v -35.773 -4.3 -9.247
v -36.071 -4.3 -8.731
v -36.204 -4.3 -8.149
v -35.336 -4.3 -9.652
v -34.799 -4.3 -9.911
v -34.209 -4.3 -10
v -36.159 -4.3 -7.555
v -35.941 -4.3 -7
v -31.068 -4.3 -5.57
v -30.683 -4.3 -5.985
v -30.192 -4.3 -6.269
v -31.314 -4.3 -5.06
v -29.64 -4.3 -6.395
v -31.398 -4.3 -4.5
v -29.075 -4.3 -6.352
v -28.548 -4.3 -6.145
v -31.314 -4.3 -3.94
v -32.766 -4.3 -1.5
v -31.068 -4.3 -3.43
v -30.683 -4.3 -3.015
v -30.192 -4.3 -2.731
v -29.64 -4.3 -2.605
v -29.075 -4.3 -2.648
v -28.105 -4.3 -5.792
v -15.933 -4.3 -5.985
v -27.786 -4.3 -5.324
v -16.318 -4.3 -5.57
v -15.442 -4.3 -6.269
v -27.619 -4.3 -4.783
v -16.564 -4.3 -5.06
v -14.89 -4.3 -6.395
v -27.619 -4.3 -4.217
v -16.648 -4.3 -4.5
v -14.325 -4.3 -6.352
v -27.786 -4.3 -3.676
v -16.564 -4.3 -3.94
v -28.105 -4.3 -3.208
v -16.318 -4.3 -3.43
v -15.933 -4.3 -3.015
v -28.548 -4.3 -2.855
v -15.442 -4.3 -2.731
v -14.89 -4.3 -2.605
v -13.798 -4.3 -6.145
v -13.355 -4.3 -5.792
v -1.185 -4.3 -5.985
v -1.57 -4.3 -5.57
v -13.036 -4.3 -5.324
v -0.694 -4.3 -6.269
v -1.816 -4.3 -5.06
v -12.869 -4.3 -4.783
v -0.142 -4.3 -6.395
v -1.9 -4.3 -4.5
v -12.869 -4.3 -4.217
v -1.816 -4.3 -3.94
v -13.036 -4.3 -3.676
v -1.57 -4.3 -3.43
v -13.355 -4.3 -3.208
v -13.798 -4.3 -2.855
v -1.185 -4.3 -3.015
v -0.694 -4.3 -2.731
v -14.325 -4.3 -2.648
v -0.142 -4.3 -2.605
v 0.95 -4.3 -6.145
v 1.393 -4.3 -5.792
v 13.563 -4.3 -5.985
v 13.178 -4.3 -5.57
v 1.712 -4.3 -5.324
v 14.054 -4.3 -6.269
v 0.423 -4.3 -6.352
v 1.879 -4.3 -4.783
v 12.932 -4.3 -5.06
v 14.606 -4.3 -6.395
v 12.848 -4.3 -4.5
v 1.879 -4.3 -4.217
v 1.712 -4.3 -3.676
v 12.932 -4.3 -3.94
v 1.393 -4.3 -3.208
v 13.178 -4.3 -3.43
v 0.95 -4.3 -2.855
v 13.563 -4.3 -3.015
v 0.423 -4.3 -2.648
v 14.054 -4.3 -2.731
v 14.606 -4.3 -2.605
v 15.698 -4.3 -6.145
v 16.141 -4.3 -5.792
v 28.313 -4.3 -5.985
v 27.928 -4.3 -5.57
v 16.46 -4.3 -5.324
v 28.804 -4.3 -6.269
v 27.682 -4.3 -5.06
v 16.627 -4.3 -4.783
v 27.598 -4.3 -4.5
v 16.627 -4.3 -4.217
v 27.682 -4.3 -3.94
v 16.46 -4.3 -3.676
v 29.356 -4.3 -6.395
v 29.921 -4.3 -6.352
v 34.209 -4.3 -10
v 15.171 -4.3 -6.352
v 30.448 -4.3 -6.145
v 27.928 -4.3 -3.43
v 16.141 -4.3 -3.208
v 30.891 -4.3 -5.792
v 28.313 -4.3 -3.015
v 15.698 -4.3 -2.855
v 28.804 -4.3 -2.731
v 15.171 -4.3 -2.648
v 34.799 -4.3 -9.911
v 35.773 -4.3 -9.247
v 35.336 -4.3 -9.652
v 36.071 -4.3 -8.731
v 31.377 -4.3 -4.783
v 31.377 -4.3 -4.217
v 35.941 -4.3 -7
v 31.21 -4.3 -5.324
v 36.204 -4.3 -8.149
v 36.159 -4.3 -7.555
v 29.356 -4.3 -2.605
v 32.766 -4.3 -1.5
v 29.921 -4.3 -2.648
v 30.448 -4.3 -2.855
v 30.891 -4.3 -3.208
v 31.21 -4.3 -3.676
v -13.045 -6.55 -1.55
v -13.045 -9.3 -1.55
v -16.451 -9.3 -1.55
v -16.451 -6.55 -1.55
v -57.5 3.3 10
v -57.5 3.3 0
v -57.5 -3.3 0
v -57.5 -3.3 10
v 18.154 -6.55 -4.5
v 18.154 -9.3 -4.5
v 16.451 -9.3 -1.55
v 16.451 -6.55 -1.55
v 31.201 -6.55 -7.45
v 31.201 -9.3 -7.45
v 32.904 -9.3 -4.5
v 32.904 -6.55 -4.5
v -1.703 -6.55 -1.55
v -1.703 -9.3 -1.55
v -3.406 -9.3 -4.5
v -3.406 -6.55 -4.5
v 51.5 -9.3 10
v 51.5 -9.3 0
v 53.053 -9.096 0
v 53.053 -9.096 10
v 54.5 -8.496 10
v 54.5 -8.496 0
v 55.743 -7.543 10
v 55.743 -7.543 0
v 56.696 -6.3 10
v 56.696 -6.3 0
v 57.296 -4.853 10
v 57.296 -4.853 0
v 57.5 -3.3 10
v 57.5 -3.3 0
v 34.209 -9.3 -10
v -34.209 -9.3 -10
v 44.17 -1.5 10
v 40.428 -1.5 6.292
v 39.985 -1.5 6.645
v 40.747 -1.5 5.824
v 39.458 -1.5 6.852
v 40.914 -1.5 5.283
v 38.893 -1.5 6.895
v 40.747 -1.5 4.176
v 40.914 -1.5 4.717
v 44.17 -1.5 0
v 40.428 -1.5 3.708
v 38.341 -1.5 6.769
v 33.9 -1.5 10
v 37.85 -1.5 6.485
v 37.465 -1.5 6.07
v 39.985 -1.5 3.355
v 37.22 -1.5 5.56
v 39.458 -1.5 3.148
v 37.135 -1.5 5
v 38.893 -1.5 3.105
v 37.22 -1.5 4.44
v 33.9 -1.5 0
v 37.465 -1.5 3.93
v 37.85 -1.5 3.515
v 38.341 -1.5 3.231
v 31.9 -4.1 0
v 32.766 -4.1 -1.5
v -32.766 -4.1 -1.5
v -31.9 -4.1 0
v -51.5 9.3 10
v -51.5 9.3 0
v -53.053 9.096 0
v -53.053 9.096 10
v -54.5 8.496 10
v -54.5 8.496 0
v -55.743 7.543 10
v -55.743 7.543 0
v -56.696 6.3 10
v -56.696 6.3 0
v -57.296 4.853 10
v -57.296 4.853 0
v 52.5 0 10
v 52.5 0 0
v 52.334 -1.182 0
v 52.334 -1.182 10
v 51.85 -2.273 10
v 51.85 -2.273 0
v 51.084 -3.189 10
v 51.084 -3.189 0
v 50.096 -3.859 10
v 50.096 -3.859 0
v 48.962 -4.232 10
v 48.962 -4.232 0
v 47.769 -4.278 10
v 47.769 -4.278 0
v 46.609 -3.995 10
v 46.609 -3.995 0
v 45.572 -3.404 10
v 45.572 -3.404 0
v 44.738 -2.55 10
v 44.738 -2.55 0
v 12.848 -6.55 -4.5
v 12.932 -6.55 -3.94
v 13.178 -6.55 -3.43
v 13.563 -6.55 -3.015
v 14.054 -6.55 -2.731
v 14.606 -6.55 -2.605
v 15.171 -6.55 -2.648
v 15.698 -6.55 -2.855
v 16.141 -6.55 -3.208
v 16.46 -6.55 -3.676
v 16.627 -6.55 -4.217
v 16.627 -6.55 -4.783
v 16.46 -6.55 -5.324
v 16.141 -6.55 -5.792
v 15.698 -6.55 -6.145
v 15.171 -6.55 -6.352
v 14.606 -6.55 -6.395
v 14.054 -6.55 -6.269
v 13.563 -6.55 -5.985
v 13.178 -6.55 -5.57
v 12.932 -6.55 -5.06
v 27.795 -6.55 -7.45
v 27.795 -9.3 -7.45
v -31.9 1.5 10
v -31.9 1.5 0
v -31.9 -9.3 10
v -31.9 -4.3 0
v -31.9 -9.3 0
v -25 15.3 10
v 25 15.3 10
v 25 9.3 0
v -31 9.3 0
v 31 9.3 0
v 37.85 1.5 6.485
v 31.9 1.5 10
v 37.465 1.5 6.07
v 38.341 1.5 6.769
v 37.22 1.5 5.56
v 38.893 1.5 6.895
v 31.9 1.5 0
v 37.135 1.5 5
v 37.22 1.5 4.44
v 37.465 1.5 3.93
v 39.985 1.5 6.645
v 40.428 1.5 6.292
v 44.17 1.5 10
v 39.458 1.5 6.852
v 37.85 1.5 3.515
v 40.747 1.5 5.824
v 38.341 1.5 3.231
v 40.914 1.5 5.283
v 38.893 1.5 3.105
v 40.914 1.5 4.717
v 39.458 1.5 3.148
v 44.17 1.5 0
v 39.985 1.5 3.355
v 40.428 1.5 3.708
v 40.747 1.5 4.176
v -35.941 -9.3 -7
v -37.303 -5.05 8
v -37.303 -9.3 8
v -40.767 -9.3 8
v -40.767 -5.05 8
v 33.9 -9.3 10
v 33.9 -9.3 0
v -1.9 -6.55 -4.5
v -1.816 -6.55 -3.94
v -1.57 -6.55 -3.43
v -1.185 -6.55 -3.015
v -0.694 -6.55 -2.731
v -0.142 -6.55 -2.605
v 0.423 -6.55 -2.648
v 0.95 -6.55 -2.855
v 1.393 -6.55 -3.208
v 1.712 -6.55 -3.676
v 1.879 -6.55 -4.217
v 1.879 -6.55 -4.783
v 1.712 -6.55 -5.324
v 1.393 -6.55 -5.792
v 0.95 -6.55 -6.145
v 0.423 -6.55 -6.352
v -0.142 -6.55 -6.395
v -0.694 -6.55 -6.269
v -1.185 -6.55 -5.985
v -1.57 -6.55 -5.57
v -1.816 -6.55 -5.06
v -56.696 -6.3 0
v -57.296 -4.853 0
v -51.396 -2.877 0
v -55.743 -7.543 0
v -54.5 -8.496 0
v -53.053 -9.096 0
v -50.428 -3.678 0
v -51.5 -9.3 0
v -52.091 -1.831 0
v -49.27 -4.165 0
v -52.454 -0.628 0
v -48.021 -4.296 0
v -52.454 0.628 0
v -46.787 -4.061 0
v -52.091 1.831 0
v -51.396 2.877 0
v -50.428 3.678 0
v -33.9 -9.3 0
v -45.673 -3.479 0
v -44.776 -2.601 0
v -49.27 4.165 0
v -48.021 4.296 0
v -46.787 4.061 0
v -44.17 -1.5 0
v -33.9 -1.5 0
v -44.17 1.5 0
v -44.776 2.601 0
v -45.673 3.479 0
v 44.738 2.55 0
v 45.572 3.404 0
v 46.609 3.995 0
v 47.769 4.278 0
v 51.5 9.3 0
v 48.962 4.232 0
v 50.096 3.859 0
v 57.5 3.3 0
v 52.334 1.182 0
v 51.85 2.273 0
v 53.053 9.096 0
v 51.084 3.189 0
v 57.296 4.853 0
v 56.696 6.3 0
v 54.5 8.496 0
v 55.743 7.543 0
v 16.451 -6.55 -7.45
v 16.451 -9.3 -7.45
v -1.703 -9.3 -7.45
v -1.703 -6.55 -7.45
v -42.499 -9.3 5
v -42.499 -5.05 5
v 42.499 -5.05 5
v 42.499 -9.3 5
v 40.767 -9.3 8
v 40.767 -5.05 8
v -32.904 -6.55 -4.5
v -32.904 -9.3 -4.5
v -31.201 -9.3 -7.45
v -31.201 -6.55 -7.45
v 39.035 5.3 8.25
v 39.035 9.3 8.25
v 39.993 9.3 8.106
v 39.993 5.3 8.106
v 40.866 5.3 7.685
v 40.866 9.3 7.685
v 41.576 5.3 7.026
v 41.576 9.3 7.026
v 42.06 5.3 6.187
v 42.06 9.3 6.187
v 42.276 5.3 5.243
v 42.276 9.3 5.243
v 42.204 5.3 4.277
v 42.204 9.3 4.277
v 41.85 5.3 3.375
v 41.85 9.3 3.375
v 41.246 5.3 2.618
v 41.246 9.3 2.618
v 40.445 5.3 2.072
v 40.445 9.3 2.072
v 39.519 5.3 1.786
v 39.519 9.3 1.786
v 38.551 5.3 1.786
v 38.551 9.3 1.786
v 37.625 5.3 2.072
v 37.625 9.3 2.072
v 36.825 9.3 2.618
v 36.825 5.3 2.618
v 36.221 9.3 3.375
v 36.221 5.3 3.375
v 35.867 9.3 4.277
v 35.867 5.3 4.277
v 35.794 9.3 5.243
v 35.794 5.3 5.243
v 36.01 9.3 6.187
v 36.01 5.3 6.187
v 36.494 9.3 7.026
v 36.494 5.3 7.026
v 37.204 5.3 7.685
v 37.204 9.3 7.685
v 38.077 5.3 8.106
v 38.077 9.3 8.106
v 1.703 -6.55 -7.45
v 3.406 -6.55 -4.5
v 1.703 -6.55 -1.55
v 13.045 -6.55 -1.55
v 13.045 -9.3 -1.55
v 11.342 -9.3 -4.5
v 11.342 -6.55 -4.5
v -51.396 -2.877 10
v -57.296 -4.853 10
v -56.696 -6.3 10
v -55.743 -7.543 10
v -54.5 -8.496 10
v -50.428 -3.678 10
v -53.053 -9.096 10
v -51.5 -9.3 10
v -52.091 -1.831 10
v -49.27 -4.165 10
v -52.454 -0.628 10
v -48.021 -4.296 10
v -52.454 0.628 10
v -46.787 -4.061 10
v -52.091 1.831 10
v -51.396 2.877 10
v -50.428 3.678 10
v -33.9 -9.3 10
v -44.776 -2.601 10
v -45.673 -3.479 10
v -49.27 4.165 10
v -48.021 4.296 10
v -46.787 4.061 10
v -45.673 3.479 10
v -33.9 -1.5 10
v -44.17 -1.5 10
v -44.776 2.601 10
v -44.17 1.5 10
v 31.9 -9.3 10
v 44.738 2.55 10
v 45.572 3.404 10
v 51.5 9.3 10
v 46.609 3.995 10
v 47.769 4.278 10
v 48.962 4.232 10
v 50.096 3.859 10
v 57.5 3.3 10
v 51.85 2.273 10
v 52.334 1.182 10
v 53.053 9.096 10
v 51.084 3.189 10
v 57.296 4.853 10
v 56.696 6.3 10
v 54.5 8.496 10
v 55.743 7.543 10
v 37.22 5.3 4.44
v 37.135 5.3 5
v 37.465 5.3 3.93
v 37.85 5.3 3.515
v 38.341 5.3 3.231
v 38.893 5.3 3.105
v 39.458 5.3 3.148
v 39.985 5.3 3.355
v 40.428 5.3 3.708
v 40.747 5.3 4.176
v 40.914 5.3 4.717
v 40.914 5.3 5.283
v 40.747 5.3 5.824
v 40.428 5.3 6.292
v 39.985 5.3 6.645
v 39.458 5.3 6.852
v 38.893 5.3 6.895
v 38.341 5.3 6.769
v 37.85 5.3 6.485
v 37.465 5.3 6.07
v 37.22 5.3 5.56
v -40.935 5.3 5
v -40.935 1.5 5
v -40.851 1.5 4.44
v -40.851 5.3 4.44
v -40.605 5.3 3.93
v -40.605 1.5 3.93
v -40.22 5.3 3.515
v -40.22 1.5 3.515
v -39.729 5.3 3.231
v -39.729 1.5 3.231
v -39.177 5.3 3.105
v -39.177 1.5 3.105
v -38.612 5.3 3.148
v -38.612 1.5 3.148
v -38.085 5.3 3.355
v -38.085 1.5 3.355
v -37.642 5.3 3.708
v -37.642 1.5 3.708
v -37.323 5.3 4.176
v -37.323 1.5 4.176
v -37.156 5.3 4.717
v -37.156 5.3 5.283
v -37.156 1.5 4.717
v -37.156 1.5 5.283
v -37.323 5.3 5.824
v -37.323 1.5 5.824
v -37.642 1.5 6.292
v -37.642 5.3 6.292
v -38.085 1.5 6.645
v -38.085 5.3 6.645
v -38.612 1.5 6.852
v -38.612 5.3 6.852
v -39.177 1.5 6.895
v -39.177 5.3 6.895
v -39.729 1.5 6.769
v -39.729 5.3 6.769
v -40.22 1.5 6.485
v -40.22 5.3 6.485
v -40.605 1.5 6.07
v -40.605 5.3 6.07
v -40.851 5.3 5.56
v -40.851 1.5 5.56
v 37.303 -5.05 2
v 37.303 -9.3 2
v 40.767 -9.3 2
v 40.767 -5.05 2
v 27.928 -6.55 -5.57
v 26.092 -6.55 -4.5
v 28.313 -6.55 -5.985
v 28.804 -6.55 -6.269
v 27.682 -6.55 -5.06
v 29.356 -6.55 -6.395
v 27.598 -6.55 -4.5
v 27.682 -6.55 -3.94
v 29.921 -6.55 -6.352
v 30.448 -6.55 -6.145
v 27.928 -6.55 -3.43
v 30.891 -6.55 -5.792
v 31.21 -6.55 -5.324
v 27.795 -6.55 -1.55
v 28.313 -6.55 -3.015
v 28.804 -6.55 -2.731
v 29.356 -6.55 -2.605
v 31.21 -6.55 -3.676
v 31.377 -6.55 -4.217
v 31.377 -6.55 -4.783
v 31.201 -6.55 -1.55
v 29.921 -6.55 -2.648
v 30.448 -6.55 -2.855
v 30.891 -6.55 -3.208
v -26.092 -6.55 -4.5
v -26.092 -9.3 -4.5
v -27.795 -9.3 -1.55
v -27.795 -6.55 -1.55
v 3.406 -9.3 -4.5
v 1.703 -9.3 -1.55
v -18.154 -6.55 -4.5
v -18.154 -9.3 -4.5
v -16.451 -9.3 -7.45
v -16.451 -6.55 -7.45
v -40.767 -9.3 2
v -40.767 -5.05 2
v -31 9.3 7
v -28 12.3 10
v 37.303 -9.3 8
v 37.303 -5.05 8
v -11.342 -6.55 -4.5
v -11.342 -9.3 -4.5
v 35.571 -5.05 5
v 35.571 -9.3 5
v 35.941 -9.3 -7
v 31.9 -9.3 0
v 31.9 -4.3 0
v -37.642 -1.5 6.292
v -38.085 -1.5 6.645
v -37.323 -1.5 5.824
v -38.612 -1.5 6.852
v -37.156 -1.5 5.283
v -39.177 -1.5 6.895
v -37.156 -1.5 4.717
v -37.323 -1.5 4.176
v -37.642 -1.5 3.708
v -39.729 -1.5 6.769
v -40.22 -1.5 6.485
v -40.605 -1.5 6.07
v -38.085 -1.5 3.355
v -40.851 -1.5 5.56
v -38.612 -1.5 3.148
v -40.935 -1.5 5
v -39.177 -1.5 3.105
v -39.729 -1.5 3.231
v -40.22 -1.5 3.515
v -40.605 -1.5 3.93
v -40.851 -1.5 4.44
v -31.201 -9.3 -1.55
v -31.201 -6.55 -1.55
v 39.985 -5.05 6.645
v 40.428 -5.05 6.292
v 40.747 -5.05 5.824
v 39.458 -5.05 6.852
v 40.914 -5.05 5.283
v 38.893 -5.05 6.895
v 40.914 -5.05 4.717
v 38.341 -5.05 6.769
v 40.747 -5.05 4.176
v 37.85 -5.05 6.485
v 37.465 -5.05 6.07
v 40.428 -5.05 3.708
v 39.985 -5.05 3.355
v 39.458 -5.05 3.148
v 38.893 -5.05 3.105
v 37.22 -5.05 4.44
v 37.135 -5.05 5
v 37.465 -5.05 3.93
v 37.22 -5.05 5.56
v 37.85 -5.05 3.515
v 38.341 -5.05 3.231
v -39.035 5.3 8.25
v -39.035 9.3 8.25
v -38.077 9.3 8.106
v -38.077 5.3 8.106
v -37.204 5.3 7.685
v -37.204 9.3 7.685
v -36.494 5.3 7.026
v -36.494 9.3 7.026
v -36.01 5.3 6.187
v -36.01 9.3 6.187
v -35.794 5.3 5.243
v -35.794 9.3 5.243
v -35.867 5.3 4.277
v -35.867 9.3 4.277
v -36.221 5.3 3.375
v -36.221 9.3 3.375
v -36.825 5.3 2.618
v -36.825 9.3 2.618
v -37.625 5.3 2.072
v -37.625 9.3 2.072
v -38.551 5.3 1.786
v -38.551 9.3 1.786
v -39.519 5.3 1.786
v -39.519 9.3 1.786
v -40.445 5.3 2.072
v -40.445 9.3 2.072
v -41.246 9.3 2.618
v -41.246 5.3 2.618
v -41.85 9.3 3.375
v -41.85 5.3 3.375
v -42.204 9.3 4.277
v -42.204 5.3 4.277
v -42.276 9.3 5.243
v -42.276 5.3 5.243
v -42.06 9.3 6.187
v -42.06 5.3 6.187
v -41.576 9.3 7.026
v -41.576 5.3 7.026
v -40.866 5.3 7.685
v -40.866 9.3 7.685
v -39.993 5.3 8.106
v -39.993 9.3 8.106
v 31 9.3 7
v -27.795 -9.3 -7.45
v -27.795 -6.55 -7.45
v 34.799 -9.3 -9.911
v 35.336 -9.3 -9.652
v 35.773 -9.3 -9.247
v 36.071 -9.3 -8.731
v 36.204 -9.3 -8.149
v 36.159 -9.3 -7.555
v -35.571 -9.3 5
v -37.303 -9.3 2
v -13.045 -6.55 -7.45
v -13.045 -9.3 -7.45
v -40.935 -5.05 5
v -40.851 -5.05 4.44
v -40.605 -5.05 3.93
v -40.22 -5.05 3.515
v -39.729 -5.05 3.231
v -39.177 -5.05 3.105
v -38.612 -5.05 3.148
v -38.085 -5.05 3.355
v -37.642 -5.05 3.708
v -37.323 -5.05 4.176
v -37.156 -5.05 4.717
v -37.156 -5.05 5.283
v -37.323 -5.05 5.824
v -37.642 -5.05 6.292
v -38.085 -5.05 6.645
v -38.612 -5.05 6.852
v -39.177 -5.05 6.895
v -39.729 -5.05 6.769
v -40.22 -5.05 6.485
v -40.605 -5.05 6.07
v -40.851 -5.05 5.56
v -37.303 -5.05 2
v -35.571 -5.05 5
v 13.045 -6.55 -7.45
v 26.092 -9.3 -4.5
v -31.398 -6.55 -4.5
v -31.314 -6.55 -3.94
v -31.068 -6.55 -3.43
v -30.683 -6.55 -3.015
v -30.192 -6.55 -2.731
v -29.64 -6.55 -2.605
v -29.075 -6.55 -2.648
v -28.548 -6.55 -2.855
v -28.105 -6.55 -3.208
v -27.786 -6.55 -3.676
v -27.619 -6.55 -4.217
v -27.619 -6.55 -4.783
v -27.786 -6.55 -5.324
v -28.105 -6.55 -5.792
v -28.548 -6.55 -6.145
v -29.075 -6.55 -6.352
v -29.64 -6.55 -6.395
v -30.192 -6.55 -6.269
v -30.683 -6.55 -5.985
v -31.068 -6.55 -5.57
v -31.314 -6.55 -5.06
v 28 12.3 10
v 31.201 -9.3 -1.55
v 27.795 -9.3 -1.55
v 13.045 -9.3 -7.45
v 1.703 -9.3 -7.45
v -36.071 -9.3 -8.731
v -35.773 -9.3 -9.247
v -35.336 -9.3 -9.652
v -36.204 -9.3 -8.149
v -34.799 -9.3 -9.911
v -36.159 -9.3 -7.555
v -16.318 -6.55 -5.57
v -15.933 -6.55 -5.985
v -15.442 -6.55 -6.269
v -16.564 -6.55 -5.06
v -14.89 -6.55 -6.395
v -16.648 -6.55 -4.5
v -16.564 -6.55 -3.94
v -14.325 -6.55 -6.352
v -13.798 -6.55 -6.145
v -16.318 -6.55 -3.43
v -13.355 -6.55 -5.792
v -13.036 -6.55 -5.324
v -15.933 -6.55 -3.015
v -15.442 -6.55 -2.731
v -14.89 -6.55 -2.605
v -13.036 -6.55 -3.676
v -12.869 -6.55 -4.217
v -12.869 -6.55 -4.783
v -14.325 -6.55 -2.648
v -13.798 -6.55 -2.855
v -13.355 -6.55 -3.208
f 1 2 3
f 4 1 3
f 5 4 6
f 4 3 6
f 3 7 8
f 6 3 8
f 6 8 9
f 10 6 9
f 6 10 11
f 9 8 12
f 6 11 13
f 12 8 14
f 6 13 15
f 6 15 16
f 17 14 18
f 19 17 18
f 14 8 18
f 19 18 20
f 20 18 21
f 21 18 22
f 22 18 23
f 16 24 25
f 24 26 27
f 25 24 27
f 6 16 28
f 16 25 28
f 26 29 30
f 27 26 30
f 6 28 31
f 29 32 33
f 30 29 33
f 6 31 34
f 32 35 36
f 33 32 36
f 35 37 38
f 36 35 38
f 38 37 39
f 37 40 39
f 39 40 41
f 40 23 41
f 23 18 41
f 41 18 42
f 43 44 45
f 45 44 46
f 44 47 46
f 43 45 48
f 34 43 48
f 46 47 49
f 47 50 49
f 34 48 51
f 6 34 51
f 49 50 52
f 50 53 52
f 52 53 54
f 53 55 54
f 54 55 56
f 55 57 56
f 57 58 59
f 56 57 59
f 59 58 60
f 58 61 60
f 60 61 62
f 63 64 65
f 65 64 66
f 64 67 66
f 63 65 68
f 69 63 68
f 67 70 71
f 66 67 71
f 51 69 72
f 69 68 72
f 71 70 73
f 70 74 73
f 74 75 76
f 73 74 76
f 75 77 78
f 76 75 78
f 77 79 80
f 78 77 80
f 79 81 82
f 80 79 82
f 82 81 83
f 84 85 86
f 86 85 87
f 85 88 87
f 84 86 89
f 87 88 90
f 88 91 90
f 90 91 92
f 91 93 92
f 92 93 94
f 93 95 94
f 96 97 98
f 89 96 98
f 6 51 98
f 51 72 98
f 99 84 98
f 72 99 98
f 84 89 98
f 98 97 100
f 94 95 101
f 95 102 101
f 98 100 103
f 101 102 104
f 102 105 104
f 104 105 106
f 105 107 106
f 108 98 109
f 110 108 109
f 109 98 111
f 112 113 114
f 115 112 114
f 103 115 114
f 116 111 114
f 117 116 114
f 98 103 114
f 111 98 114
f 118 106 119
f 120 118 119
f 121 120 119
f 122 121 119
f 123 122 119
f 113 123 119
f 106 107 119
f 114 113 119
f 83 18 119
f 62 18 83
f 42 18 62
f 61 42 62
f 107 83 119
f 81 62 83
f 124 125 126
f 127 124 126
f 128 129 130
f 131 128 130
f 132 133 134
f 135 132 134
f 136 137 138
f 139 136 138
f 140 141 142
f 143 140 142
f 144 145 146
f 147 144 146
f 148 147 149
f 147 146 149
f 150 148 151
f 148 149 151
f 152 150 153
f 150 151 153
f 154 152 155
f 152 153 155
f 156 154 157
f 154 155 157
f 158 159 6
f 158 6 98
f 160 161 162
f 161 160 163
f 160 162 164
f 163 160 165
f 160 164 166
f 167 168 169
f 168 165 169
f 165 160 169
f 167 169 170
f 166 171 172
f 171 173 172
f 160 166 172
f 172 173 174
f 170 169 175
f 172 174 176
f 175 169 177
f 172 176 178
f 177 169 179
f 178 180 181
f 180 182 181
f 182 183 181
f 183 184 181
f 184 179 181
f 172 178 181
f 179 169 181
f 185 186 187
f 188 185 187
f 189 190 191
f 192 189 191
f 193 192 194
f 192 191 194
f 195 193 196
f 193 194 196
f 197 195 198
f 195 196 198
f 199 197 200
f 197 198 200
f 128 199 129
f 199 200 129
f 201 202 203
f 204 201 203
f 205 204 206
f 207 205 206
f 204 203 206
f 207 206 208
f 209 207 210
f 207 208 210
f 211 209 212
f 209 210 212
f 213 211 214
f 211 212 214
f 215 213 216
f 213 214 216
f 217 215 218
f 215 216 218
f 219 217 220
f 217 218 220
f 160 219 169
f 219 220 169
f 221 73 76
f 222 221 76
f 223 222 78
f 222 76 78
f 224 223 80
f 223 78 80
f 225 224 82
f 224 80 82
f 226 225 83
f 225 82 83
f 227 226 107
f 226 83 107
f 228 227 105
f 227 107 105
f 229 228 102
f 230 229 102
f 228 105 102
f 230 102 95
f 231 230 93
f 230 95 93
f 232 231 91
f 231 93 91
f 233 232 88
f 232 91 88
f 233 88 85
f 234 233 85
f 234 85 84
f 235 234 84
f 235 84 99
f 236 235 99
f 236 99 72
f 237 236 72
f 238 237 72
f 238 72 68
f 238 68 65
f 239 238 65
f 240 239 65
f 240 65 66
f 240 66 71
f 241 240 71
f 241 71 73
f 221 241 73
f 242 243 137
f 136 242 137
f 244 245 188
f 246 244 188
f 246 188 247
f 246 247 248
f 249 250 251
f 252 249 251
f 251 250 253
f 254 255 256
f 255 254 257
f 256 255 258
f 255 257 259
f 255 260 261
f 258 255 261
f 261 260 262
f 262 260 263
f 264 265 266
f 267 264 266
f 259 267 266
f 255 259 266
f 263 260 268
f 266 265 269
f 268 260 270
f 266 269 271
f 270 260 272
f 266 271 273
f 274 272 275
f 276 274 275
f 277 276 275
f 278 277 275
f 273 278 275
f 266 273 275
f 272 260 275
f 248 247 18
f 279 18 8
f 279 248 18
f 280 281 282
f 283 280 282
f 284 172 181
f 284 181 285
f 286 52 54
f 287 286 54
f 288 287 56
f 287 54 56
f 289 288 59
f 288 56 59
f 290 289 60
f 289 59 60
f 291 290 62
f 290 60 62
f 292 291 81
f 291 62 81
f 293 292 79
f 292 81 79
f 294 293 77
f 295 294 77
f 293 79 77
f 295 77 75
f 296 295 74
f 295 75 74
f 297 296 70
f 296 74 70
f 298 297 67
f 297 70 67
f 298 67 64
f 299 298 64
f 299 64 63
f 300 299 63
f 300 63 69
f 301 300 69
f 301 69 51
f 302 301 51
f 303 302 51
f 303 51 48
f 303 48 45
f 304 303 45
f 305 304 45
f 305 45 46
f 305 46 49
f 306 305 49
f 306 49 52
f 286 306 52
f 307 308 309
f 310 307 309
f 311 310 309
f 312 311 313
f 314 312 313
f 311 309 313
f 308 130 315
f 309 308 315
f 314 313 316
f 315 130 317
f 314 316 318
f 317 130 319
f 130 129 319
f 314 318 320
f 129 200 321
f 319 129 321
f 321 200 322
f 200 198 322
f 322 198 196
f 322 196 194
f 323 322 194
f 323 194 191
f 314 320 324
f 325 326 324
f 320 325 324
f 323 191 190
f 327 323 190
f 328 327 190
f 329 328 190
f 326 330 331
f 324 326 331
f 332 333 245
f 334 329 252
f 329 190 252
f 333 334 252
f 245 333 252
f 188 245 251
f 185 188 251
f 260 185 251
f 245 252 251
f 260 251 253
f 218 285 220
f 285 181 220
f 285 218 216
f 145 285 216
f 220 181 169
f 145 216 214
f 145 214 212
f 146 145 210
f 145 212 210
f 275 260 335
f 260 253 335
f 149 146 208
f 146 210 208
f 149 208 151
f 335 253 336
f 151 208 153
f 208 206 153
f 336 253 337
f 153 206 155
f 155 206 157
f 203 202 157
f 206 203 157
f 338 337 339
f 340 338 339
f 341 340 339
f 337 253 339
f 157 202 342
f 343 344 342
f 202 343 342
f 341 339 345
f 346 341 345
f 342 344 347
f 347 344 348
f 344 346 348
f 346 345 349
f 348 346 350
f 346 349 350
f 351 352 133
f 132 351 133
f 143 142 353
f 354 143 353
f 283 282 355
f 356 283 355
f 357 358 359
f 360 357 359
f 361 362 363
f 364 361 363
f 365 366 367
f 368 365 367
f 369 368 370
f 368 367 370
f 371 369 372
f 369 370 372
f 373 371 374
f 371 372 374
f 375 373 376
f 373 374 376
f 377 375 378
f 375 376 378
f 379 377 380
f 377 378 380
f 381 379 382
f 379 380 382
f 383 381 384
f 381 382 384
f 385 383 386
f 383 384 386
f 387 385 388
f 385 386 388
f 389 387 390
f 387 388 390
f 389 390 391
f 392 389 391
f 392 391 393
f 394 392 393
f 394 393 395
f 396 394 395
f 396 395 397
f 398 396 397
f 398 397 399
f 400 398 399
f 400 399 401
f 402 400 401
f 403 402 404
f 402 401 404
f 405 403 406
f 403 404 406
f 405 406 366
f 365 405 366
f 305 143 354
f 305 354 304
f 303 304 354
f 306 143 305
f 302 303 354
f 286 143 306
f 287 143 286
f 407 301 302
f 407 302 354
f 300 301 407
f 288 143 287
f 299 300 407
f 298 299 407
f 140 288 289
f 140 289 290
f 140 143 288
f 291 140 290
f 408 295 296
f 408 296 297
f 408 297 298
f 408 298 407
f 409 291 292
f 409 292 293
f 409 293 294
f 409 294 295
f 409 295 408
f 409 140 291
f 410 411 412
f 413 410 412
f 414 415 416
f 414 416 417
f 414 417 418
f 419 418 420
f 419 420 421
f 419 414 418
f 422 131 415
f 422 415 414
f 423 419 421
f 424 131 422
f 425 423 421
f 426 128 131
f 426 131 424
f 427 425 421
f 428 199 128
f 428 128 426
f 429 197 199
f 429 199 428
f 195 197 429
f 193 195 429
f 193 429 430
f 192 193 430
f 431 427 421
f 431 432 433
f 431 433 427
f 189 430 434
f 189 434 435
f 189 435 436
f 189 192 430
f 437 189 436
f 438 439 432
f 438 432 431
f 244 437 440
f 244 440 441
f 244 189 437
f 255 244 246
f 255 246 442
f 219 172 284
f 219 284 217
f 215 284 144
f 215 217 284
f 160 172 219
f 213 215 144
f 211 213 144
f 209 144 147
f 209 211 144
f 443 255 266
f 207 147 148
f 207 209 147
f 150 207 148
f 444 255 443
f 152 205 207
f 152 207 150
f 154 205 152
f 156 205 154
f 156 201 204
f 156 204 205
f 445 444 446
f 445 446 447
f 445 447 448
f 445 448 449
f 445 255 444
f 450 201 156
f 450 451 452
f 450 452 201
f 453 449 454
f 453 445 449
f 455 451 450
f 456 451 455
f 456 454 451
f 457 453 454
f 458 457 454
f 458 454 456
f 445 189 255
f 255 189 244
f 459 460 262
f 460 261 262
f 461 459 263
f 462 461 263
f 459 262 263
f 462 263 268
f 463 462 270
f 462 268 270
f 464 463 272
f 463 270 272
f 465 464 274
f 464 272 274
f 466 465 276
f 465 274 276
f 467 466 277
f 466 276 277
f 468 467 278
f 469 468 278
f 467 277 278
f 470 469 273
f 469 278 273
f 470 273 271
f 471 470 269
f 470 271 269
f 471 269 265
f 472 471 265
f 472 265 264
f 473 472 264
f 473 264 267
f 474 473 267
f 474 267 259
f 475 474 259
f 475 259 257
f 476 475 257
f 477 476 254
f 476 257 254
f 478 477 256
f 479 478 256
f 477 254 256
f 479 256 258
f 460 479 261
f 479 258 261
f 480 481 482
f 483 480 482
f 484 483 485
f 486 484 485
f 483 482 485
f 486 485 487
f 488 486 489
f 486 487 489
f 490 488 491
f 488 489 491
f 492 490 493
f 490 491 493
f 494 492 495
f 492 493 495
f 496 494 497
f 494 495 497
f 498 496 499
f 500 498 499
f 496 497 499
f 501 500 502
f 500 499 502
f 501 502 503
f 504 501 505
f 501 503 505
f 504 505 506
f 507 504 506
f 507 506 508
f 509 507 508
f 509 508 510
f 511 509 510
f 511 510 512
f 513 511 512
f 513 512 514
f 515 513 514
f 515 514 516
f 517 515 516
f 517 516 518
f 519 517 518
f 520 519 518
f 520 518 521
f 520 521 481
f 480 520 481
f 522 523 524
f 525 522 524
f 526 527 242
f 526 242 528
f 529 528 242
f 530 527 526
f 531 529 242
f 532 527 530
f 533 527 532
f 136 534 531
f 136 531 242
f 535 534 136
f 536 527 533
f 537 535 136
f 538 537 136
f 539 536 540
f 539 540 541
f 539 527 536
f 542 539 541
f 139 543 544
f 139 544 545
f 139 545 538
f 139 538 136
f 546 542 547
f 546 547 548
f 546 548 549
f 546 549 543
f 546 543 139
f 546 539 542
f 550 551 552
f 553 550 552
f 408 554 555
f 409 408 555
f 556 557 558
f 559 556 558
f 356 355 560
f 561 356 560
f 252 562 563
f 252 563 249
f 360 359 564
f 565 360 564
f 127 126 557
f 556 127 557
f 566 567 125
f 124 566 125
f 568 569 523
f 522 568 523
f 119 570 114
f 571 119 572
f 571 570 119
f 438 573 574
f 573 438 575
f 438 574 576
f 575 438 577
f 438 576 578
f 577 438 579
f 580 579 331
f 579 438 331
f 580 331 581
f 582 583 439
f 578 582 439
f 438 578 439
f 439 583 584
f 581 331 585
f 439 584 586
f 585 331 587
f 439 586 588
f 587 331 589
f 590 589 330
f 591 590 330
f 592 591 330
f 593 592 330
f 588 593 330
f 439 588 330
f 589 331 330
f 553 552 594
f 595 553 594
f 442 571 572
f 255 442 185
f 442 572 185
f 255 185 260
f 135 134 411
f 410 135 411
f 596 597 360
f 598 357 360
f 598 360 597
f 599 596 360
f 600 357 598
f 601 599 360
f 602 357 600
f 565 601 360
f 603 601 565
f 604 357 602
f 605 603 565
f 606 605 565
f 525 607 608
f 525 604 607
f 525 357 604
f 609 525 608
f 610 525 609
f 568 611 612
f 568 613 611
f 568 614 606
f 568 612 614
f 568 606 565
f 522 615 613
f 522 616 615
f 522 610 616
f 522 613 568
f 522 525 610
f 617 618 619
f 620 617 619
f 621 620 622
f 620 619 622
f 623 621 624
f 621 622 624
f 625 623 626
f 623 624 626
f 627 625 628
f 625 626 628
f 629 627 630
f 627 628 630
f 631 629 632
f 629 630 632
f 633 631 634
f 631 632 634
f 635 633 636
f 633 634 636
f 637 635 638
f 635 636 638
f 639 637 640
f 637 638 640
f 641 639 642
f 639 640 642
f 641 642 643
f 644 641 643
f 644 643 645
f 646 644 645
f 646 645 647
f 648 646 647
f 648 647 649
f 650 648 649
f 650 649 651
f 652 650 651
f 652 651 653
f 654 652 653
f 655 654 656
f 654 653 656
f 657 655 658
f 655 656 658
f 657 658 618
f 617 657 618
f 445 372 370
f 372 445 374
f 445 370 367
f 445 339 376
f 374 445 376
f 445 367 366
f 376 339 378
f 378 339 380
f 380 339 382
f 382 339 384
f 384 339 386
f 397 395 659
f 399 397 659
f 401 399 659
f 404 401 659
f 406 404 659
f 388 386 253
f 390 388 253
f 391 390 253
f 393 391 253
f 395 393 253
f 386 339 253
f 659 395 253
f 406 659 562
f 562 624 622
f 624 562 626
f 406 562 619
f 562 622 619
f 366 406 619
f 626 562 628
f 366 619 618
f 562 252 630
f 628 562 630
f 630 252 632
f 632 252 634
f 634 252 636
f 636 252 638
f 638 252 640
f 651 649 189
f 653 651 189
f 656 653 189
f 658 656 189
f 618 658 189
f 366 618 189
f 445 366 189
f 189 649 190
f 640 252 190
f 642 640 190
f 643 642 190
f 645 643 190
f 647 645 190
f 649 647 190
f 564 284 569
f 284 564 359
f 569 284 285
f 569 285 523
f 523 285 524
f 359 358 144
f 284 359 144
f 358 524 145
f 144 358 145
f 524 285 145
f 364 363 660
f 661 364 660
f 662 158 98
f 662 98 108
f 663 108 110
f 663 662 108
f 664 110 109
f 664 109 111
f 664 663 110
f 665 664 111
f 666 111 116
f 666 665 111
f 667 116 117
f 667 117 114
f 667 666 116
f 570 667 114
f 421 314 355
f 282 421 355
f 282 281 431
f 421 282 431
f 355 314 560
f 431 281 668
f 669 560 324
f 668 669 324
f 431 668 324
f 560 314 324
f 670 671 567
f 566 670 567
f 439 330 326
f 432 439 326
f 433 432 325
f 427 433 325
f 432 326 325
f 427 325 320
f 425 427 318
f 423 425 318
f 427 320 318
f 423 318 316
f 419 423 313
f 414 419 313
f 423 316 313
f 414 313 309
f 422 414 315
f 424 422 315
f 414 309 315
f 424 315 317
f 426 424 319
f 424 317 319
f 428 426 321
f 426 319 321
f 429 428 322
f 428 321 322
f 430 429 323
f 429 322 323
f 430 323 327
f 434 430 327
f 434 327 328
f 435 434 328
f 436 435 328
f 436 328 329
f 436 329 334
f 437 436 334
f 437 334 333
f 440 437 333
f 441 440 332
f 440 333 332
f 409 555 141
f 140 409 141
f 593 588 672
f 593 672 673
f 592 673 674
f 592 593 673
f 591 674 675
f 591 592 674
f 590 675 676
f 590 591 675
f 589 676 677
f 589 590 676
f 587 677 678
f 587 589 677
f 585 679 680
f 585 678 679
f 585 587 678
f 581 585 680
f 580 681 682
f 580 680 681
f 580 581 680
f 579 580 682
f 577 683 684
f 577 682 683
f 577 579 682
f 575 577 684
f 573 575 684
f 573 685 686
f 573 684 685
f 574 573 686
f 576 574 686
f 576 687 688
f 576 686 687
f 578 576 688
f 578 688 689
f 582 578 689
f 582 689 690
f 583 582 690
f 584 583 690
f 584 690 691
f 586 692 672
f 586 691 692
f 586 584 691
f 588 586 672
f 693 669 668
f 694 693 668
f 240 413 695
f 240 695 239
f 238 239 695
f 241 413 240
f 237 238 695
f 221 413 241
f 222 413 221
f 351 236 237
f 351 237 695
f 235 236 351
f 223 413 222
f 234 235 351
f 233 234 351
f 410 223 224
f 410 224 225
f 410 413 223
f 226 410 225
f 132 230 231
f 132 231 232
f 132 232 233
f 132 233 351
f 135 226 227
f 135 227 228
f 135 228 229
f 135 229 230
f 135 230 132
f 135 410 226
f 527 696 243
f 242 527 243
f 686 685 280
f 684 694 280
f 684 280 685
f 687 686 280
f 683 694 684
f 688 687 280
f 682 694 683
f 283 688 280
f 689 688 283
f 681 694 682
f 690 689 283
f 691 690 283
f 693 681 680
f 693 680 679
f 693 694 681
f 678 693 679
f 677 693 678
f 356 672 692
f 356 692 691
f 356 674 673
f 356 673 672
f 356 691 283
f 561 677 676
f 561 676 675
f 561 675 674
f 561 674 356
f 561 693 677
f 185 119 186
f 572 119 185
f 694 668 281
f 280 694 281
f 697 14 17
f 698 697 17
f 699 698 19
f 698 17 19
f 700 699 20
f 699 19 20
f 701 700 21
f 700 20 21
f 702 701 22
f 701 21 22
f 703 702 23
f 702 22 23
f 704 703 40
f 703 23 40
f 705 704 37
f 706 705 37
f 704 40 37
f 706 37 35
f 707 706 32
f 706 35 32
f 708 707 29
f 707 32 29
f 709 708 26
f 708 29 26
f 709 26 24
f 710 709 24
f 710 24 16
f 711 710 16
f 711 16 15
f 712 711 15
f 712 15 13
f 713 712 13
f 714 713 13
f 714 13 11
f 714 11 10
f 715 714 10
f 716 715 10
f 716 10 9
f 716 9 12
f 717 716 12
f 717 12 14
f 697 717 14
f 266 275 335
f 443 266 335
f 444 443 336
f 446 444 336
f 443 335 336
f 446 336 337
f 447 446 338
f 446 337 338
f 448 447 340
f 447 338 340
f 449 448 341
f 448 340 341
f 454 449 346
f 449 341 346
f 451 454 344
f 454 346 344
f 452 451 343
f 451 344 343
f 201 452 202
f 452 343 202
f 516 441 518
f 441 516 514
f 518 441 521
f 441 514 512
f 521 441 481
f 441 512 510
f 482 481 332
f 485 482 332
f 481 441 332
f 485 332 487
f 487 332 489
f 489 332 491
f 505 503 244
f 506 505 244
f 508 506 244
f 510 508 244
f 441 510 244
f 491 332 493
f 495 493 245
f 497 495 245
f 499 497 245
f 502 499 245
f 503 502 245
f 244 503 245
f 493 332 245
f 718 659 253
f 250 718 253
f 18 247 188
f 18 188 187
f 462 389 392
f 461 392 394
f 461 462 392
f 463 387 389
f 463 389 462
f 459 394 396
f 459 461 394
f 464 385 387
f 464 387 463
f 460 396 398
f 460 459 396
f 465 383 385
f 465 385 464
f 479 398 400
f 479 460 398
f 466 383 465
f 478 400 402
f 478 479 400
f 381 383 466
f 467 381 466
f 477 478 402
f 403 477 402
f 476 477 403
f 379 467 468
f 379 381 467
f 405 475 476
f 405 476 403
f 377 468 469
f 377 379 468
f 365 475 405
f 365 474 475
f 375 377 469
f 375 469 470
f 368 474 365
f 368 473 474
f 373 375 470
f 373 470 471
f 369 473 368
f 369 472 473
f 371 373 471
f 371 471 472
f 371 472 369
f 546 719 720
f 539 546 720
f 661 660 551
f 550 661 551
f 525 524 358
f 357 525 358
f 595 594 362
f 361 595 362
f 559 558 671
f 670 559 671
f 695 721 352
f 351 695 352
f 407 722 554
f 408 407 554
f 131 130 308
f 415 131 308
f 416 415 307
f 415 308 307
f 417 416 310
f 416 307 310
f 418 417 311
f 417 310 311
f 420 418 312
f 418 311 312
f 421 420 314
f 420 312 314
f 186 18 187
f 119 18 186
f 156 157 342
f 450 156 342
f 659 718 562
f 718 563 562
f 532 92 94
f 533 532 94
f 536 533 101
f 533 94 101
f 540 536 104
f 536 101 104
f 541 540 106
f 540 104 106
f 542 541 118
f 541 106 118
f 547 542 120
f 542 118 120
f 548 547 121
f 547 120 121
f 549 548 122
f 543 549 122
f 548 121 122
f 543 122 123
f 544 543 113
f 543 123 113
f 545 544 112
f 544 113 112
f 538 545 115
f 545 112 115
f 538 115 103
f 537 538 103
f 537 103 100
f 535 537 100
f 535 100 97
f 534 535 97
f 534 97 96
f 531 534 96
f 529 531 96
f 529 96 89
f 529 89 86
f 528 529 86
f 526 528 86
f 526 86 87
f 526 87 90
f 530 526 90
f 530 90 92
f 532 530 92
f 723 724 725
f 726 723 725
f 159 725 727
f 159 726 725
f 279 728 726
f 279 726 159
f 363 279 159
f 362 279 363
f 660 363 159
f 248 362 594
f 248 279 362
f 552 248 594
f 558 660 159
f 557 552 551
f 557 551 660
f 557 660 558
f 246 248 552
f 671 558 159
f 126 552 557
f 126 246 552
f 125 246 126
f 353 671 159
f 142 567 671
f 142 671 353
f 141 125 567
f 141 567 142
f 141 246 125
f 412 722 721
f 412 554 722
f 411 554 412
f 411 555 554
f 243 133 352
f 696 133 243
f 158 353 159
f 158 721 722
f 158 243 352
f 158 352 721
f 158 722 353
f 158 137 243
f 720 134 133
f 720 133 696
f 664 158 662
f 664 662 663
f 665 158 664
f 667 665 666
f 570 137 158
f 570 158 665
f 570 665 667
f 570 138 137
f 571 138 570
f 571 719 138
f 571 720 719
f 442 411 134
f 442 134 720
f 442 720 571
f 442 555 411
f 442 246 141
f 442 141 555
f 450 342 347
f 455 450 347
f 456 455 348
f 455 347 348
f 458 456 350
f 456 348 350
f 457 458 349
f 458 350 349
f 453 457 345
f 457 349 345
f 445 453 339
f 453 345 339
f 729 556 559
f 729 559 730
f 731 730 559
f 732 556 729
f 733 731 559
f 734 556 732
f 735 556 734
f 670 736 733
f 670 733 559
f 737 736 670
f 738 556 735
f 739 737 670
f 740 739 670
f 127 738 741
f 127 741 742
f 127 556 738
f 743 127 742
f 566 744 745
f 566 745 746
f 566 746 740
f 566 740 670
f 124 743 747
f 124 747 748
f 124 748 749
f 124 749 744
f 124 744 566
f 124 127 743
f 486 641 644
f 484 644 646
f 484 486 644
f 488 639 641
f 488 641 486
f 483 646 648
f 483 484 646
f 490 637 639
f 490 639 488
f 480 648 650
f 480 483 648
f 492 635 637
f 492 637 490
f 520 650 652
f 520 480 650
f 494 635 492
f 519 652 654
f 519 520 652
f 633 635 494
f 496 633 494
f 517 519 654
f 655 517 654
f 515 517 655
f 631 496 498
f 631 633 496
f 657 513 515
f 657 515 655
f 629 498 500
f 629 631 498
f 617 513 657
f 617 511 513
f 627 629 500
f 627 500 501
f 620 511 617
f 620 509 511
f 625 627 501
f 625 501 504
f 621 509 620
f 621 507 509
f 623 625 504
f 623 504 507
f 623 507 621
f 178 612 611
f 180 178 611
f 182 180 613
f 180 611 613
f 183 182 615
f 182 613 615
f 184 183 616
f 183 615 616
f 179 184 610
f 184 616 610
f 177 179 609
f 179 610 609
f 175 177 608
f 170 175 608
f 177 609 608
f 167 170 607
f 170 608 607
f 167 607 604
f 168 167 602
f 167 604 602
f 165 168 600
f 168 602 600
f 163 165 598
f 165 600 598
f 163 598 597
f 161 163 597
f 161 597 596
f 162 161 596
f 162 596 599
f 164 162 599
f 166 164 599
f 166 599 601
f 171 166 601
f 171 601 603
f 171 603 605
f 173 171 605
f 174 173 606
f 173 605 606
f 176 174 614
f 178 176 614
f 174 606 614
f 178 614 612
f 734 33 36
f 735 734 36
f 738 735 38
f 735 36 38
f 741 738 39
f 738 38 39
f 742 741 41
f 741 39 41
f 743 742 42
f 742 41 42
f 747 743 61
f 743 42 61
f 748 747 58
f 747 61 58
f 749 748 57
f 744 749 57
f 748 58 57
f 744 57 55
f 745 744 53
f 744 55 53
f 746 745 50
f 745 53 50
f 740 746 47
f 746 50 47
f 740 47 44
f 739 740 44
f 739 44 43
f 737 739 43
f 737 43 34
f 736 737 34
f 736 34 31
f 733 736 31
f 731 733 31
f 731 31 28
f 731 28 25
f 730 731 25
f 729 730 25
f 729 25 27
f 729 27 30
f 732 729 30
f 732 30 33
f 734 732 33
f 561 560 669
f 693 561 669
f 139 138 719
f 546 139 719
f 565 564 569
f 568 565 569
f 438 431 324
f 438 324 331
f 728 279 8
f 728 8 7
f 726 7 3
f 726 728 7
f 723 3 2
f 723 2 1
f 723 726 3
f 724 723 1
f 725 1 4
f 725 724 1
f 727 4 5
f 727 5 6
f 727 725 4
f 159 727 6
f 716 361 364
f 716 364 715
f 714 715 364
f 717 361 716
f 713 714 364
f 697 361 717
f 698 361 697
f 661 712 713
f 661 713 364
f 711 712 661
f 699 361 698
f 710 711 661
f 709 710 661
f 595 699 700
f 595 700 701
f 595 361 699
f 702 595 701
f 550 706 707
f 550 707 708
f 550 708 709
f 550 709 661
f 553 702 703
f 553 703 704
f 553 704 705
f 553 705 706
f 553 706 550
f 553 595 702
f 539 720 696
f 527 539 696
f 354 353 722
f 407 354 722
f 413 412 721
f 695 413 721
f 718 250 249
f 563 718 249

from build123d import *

# Parameters (mm, degrees)
SALIENTE_EXTRUIR1_DEPTH = 10
CROQUIS2_R              = 1.9
CORTAR_EXTRUIR1_DEPTH   = 25
CROQUIS5_R              = 3.25
CORTAR_EXTRUIR3_DEPTH   = 4
CORTAR_EXTRUIR4_DEPTH   = 4.25
SALIENTE_EXTRUIR2_DEPTH = 25
CHAFL_N2_SIZE           = 6
SALIENTE_EXTRUIR3_DEPTH = 5
CROQUIS9_R              = 1.9
CORTAR_EXTRUIR5_DEPTH   = 62.56630572
CORTAR_EXTRUIR6_DEPTH   = 2.75
SALIENTE_EXTRUIR4_DEPTH = 0.2


with BuildPart() as part:
    # Croquis1 → Saliente-Extruir1 (new body)
    with BuildSketch(Plane.XY):
        with BuildLine():
            Line((51.5, 9.3), (-51.5, 9.3))
            ThreePointArc((-51.5, 9.3), (-55.742640687, 7.542640687), (-57.5, 3.3))
            Line((-57.5, 3.3), (-57.5, -3.3))
            ThreePointArc((-57.5, -3.3), (-55.742640687, -7.542640687), (-51.5, -9.3))
            Line((-51.5, -9.3), (-33.9, -9.3))
            Line((-33.9, -9.3), (-33.9, -1.5))
            Line((-33.9, -1.5), (-44.170111664, -1.5))
            ThreePointArc((-44.170111664, -1.5), (-52.5, 0), (-44.170111664, 1.5))
            Line((-44.170111664, 1.5), (-31.9, 1.5))
            Line((-31.9, 1.5), (-31.9, -9.3))
            Line((-31.9, -9.3), (31.9, -9.3))
            Line((31.9, -9.3), (31.9, 1.5))
            Line((31.9, 1.5), (44.170111664, 1.5))
            ThreePointArc((44.170111664, 1.5), (48.962063041, 4.231933355), (52.5, 0))
            ThreePointArc((52.5, 0), (48.962063041, -4.231933355), (44.170111664, -1.5))
            Line((44.170111664, -1.5), (33.9, -1.5))
            Line((33.9, -1.5), (33.9, -9.3))
            Line((33.9, -9.3), (51.5, -9.3))
            ThreePointArc((51.5, -9.3), (55.742640687, -7.542640687), (57.5, -3.3))
            Line((57.5, -3.3), (57.5, 3.3))
            ThreePointArc((57.5, 3.3), (55.742640687, 7.542640687), (51.5, 9.3))
        make_face()
    extrude(amount=SALIENTE_EXTRUIR1_DEPTH)

    # Croquis2 → Cortar-Extruir1 (cut, symmetric)
    with BuildSketch(Plane.XZ.offset(-1.5)):
        with Locations(Location((-39.035111664, 5, 0), (0, 0, 180))):
            Circle(CROQUIS2_R)
        with Locations(Location((39.035111664, 5, 0), (0, 0, 180))):
            Circle(CROQUIS2_R)
    extrude(amount=CORTAR_EXTRUIR1_DEPTH, both=True, mode=Mode.SUBTRACT)

    # Croquis5 → Cortar-Extruir3 (cut)
    with BuildSketch(Plane(origin=(0, 9.3, 0), x_dir=(1, 0, 0), z_dir=(0, 1, 0))):
        with Locations(Location((-39.035111664, -5, 0), (0, 0, 270))):
            Circle(CROQUIS5_R)
        with Locations(Location((39.035111664, -5, 0), (0, 0, 270))):
            Circle(CROQUIS5_R)
    extrude(amount=-CORTAR_EXTRUIR3_DEPTH, mode=Mode.SUBTRACT)

    # Croquis6 → Cortar-Extruir4 (cut)
    with BuildSketch(Plane(origin=(0, -9.3, 0), x_dir=(-1, 0, 0), z_dir=(0, -1, 0))):
        Polygon((42.499213279, -5), (40.767162472, -2), (37.303060857, -2), (35.571010049, -5), (37.303060857, -8), (40.767162472, -8), align=None)
        Polygon((-42.499213279, -5), (-40.767162472, -8), (-37.303060857, -8), (-35.571010049, -5), (-37.303060857, -2), (-40.767162472, -2), align=None)
    extrude(amount=-CORTAR_EXTRUIR4_DEPTH, mode=Mode.SUBTRACT)

    # Croquis7 → Saliente-Extruir2 (add, symmetric)
    with BuildSketch(Plane.ZY):
        Polygon((0, 9.3), (10, 15.3), (10, 12.3), (7, 9.3), align=None)
    extrude(amount=SALIENTE_EXTRUIR2_DEPTH, both=True)

    # Chaflán2
    # the kernel refuses this chamfer: 6 mm, written as the material it adds along each edge
    with BuildSketch(Plane(origin=(-25, 9.3, 22.430097928), x_dir=(-0.9996219169112968, -0.02749587661058678, 0), z_dir=(0, 0, -1))) as chafl_n2_piece_1_section:
        Polygon((CHAFL_N2_SIZE * 0.999621916911, CHAFL_N2_SIZE * 0.0274958766106), (-CHAFL_N2_SIZE * 0.0274958766106, CHAFL_N2_SIZE * 0.999621916911), (0, 0), align=None)
    chafl_n2_piece_1 = extrude(amount=37.860195856, mode=Mode.PRIVATE)
    chafl_n2_piece_1 = split(chafl_n2_piece_1, bisect_by=Plane(origin=(-27.180769231, 9.432692308, 7.132692308), z_dir=(0, 0.7071067811865436, -0.7071067811865516)), keep=Keep.TOP, mode=Mode.PRIVATE)
    chafl_n2_piece_1 = split(chafl_n2_piece_1, bisect_by=Plane(origin=(-27.180769231, 10.938461538, 10), z_dir=(0, 0, -1)), keep=Keep.TOP, mode=Mode.PRIVATE)
    chafl_n2_piece_1 = split(chafl_n2_piece_1, bisect_by=Plane(origin=(-27.180769231, 12.216176471, 4.860294118), z_dir=(0, -0.8574929257125441, 0.5144957554275267)), keep=Keep.TOP, mode=Mode.PRIVATE)
    add(chafl_n2_piece_1)
    with BuildSketch(Plane(origin=(25, 9.3, 22.430097928), x_dir=(0.9996219169112969, -0.02749587661058621, 0), z_dir=(0, 0, -1))) as chafl_n2_piece_2_section:
        Polygon((CHAFL_N2_SIZE * 0.999621916911, -CHAFL_N2_SIZE * 0.0274958766106), (-CHAFL_N2_SIZE * 0.0274958766106, -CHAFL_N2_SIZE * 0.999621916911), (0, 0), align=None)
    chafl_n2_piece_2 = extrude(amount=37.860195856, mode=Mode.PRIVATE)
    chafl_n2_piece_2 = split(chafl_n2_piece_2, bisect_by=Plane(origin=(27.180769231, 9.432692308, 7.132692308), z_dir=(0, 0.7071067811865436, -0.7071067811865516)), keep=Keep.TOP, mode=Mode.PRIVATE)
    chafl_n2_piece_2 = split(chafl_n2_piece_2, bisect_by=Plane(origin=(27.180769231, 10.938461538, 10), z_dir=(0, 0, -1)), keep=Keep.TOP, mode=Mode.PRIVATE)
    chafl_n2_piece_2 = split(chafl_n2_piece_2, bisect_by=Plane(origin=(27.180769231, 12.216176471, 4.860294118), z_dir=(0, -0.8574929257125441, 0.5144957554275267)), keep=Keep.TOP, mode=Mode.PRIVATE)
    add(chafl_n2_piece_2)

    # Croquis8 → Saliente-Extruir3 (add)
    with BuildSketch(Plane.XZ.offset(9.3)):
        with BuildLine():
            Line((-31.9, 0), (-35.941451884, -7))
            ThreePointArc((-35.941451884, -7), (-35.941451884, -9), (-34.209401077, -10))
            Line((-34.209401077, -10), (34.209401077, -10))
            ThreePointArc((34.209401077, -10), (35.941451884, -9), (35.941451884, -7))
            Line((35.941451884, -7), (31.9, 0))
            Line((31.9, 0), (-31.9, 0))
        make_face()
    extrude(amount=-SALIENTE_EXTRUIR3_DEPTH)

    # Croquis9 → Cortar-Extruir5 (cut, through all)
    with BuildSketch(Plane(origin=(0, -4.3, 0), x_dir=(1, 0, 0), z_dir=(0, 1, 0))):
        with Locations(Location((0, 4.5, 0), (0, 0, 180))):
            Circle(CROQUIS9_R)
        with Locations(Location((-29.498076211, 4.5, 0), (0, 0, 180))):
            Circle(CROQUIS9_R)
        with Locations(Location((-14.748076211, 4.5, 0), (0, 0, 180))):
            Circle(CROQUIS9_R)
        with Locations(Location((14.748076211, 4.5, 0), (0, 0, 180))):
            Circle(CROQUIS9_R)
        with Locations(Location((29.498076211, 4.5, 0), (0, 0, 180))):
            Circle(CROQUIS9_R)
    extrude(amount=-CORTAR_EXTRUIR5_DEPTH, mode=Mode.SUBTRACT)

    # Croquis10 → Cortar-Extruir6 (cut)
    with BuildSketch(Plane.XZ.offset(9.3)):
        Polygon((3.406366588, -4.5), (1.703183294, -1.55), (-1.703183294, -1.55), (-3.406366588, -4.5), (-1.703183294, -7.45), (1.703183294, -7.45), align=None)
        Polygon((-11.341709623, -4.5), (-13.044892917, -1.55), (-16.451259505, -1.55), (-18.1544428, -4.5), (-16.451259505, -7.45), (-13.044892917, -7.45), align=None)
        Polygon((-26.091709623, -4.5), (-27.794892917, -1.55), (-31.201259505, -1.55), (-32.9044428, -4.5), (-31.201259505, -7.45), (-27.794892917, -7.45), align=None)
        Polygon((18.1544428, -4.5), (16.451259505, -1.55), (13.044892917, -1.55), (11.341709623, -4.5), (13.044892917, -7.45), (16.451259505, -7.45), align=None)
        Polygon((32.9044428, -4.5), (31.201259505, -1.55), (27.794892917, -1.55), (26.091709623, -4.5), (27.794892917, -7.45), (31.201259505, -7.45), align=None)
    extrude(amount=-CORTAR_EXTRUIR6_DEPTH, mode=Mode.SUBTRACT)

    # Croquis11 → Saliente-Extruir4 (add)
    with BuildSketch(Plane(origin=(0, -4.3, 0), x_dir=(1, 0, 0), z_dir=(0, 1, 0))):
        Polygon((-31.9, 0), (-32.766025404, 1.5), (32.766025404, 1.5), (31.9, 0), align=None)
    extrude(amount=SALIENTE_EXTRUIR4_DEPTH)


solid = part.part
